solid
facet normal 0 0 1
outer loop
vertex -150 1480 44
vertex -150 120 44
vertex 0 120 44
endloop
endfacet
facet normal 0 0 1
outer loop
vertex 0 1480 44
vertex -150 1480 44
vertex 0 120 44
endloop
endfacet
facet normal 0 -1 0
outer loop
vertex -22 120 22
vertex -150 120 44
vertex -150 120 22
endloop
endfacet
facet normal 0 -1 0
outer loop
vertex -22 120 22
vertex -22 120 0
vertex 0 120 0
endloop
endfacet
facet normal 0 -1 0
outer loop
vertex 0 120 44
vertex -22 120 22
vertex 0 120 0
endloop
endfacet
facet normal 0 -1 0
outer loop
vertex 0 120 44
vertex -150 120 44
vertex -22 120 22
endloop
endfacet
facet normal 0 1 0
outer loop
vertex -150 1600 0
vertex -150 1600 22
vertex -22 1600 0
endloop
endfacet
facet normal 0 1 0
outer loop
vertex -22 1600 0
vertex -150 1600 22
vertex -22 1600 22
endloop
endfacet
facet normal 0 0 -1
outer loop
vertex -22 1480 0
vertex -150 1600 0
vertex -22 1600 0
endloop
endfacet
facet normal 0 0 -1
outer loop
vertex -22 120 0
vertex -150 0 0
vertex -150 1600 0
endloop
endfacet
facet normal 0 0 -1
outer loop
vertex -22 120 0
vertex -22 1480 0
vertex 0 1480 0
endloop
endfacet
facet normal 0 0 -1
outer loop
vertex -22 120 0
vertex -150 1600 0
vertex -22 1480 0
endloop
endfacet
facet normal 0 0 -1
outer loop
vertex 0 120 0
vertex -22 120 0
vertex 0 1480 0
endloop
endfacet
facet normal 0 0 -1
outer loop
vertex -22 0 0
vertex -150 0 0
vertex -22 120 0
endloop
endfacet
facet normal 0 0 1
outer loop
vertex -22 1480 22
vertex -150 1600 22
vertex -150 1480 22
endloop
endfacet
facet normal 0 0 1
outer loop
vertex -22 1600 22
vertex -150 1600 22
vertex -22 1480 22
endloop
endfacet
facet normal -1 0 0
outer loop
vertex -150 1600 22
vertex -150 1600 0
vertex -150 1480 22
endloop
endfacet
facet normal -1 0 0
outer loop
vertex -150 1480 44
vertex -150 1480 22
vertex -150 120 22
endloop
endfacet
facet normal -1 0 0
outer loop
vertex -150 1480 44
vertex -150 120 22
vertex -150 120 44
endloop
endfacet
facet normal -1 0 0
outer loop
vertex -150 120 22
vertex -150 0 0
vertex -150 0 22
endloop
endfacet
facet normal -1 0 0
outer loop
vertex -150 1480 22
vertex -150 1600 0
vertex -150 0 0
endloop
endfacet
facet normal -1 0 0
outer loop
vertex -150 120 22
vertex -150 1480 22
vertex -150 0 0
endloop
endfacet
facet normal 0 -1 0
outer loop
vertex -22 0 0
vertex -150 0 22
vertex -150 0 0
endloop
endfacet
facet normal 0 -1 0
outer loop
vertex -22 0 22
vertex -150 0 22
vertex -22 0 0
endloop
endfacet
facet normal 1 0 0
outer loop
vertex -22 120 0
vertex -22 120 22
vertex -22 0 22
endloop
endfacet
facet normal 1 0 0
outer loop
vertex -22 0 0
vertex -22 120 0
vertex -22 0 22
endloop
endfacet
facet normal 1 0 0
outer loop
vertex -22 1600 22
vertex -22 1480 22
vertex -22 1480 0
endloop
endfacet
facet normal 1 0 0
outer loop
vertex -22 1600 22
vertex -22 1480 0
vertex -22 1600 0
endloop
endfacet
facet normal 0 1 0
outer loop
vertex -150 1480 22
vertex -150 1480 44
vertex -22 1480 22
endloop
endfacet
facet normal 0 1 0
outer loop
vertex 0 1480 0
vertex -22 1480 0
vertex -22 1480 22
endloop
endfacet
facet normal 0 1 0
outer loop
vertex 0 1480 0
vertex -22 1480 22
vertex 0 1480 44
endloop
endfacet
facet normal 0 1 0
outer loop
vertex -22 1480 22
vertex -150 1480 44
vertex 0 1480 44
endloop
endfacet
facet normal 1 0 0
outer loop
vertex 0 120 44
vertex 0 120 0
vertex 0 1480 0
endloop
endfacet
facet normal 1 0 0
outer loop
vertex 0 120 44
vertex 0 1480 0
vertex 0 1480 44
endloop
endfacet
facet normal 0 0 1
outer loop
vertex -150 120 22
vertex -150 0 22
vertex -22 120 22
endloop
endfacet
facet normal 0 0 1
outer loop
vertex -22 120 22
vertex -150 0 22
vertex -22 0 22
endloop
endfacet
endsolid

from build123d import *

# Parameters (mm, degrees)
F0_W     = 150
F0_H     = 44
F1_DEPTH = 1600
F4_W     = 22
F4_H     = 120
F5_DEPTH = 44
F6_W     = 128
F6_H     = 120
F7_DEPTH = 22


# Not quite as in the source:
# - a pattern or mirror of a feature is missing from the dataset's text; its kind, count and spacing are read off the source's solid


with BuildPart() as f1:
    # F0 (on Front) → F1 (new body)
    with BuildSketch(Plane.XZ):
        with Locations((-75, 22)):
            Rectangle(F0_W, F0_H)
    extrude(amount=-F1_DEPTH)

    # F4 (on face) → F5 (cut, through all)
    with BuildSketch(Plane.XY.offset(44)):
        with Locations((-11, 1540)):
            Rectangle(F4_W, F4_H)
    f5 = extrude(amount=-F5_DEPTH, mode=Mode.SUBTRACT)

    # F5_copies: F5 across plane
    add(f5.mirror(Plane(origin=(0, 800, 0), x_dir=(0, 0, -1), z_dir=(0, -1, 0))), mode=Mode.SUBTRACT)

    # F6 (on face) → F7 (cut)
    with BuildSketch(Plane.XY.offset(44)):
        with Locations((-86, 1540)):
            Rectangle(F6_W, F6_H)
    f7 = extrude(amount=-F7_DEPTH, mode=Mode.SUBTRACT)

    # F7_copies: F7 across plane
    add(f7.mirror(Plane(origin=(0, 800, 0), x_dir=(0, 0, -1), z_dir=(0, -1, 0))), mode=Mode.SUBTRACT)


solid = f1.part
